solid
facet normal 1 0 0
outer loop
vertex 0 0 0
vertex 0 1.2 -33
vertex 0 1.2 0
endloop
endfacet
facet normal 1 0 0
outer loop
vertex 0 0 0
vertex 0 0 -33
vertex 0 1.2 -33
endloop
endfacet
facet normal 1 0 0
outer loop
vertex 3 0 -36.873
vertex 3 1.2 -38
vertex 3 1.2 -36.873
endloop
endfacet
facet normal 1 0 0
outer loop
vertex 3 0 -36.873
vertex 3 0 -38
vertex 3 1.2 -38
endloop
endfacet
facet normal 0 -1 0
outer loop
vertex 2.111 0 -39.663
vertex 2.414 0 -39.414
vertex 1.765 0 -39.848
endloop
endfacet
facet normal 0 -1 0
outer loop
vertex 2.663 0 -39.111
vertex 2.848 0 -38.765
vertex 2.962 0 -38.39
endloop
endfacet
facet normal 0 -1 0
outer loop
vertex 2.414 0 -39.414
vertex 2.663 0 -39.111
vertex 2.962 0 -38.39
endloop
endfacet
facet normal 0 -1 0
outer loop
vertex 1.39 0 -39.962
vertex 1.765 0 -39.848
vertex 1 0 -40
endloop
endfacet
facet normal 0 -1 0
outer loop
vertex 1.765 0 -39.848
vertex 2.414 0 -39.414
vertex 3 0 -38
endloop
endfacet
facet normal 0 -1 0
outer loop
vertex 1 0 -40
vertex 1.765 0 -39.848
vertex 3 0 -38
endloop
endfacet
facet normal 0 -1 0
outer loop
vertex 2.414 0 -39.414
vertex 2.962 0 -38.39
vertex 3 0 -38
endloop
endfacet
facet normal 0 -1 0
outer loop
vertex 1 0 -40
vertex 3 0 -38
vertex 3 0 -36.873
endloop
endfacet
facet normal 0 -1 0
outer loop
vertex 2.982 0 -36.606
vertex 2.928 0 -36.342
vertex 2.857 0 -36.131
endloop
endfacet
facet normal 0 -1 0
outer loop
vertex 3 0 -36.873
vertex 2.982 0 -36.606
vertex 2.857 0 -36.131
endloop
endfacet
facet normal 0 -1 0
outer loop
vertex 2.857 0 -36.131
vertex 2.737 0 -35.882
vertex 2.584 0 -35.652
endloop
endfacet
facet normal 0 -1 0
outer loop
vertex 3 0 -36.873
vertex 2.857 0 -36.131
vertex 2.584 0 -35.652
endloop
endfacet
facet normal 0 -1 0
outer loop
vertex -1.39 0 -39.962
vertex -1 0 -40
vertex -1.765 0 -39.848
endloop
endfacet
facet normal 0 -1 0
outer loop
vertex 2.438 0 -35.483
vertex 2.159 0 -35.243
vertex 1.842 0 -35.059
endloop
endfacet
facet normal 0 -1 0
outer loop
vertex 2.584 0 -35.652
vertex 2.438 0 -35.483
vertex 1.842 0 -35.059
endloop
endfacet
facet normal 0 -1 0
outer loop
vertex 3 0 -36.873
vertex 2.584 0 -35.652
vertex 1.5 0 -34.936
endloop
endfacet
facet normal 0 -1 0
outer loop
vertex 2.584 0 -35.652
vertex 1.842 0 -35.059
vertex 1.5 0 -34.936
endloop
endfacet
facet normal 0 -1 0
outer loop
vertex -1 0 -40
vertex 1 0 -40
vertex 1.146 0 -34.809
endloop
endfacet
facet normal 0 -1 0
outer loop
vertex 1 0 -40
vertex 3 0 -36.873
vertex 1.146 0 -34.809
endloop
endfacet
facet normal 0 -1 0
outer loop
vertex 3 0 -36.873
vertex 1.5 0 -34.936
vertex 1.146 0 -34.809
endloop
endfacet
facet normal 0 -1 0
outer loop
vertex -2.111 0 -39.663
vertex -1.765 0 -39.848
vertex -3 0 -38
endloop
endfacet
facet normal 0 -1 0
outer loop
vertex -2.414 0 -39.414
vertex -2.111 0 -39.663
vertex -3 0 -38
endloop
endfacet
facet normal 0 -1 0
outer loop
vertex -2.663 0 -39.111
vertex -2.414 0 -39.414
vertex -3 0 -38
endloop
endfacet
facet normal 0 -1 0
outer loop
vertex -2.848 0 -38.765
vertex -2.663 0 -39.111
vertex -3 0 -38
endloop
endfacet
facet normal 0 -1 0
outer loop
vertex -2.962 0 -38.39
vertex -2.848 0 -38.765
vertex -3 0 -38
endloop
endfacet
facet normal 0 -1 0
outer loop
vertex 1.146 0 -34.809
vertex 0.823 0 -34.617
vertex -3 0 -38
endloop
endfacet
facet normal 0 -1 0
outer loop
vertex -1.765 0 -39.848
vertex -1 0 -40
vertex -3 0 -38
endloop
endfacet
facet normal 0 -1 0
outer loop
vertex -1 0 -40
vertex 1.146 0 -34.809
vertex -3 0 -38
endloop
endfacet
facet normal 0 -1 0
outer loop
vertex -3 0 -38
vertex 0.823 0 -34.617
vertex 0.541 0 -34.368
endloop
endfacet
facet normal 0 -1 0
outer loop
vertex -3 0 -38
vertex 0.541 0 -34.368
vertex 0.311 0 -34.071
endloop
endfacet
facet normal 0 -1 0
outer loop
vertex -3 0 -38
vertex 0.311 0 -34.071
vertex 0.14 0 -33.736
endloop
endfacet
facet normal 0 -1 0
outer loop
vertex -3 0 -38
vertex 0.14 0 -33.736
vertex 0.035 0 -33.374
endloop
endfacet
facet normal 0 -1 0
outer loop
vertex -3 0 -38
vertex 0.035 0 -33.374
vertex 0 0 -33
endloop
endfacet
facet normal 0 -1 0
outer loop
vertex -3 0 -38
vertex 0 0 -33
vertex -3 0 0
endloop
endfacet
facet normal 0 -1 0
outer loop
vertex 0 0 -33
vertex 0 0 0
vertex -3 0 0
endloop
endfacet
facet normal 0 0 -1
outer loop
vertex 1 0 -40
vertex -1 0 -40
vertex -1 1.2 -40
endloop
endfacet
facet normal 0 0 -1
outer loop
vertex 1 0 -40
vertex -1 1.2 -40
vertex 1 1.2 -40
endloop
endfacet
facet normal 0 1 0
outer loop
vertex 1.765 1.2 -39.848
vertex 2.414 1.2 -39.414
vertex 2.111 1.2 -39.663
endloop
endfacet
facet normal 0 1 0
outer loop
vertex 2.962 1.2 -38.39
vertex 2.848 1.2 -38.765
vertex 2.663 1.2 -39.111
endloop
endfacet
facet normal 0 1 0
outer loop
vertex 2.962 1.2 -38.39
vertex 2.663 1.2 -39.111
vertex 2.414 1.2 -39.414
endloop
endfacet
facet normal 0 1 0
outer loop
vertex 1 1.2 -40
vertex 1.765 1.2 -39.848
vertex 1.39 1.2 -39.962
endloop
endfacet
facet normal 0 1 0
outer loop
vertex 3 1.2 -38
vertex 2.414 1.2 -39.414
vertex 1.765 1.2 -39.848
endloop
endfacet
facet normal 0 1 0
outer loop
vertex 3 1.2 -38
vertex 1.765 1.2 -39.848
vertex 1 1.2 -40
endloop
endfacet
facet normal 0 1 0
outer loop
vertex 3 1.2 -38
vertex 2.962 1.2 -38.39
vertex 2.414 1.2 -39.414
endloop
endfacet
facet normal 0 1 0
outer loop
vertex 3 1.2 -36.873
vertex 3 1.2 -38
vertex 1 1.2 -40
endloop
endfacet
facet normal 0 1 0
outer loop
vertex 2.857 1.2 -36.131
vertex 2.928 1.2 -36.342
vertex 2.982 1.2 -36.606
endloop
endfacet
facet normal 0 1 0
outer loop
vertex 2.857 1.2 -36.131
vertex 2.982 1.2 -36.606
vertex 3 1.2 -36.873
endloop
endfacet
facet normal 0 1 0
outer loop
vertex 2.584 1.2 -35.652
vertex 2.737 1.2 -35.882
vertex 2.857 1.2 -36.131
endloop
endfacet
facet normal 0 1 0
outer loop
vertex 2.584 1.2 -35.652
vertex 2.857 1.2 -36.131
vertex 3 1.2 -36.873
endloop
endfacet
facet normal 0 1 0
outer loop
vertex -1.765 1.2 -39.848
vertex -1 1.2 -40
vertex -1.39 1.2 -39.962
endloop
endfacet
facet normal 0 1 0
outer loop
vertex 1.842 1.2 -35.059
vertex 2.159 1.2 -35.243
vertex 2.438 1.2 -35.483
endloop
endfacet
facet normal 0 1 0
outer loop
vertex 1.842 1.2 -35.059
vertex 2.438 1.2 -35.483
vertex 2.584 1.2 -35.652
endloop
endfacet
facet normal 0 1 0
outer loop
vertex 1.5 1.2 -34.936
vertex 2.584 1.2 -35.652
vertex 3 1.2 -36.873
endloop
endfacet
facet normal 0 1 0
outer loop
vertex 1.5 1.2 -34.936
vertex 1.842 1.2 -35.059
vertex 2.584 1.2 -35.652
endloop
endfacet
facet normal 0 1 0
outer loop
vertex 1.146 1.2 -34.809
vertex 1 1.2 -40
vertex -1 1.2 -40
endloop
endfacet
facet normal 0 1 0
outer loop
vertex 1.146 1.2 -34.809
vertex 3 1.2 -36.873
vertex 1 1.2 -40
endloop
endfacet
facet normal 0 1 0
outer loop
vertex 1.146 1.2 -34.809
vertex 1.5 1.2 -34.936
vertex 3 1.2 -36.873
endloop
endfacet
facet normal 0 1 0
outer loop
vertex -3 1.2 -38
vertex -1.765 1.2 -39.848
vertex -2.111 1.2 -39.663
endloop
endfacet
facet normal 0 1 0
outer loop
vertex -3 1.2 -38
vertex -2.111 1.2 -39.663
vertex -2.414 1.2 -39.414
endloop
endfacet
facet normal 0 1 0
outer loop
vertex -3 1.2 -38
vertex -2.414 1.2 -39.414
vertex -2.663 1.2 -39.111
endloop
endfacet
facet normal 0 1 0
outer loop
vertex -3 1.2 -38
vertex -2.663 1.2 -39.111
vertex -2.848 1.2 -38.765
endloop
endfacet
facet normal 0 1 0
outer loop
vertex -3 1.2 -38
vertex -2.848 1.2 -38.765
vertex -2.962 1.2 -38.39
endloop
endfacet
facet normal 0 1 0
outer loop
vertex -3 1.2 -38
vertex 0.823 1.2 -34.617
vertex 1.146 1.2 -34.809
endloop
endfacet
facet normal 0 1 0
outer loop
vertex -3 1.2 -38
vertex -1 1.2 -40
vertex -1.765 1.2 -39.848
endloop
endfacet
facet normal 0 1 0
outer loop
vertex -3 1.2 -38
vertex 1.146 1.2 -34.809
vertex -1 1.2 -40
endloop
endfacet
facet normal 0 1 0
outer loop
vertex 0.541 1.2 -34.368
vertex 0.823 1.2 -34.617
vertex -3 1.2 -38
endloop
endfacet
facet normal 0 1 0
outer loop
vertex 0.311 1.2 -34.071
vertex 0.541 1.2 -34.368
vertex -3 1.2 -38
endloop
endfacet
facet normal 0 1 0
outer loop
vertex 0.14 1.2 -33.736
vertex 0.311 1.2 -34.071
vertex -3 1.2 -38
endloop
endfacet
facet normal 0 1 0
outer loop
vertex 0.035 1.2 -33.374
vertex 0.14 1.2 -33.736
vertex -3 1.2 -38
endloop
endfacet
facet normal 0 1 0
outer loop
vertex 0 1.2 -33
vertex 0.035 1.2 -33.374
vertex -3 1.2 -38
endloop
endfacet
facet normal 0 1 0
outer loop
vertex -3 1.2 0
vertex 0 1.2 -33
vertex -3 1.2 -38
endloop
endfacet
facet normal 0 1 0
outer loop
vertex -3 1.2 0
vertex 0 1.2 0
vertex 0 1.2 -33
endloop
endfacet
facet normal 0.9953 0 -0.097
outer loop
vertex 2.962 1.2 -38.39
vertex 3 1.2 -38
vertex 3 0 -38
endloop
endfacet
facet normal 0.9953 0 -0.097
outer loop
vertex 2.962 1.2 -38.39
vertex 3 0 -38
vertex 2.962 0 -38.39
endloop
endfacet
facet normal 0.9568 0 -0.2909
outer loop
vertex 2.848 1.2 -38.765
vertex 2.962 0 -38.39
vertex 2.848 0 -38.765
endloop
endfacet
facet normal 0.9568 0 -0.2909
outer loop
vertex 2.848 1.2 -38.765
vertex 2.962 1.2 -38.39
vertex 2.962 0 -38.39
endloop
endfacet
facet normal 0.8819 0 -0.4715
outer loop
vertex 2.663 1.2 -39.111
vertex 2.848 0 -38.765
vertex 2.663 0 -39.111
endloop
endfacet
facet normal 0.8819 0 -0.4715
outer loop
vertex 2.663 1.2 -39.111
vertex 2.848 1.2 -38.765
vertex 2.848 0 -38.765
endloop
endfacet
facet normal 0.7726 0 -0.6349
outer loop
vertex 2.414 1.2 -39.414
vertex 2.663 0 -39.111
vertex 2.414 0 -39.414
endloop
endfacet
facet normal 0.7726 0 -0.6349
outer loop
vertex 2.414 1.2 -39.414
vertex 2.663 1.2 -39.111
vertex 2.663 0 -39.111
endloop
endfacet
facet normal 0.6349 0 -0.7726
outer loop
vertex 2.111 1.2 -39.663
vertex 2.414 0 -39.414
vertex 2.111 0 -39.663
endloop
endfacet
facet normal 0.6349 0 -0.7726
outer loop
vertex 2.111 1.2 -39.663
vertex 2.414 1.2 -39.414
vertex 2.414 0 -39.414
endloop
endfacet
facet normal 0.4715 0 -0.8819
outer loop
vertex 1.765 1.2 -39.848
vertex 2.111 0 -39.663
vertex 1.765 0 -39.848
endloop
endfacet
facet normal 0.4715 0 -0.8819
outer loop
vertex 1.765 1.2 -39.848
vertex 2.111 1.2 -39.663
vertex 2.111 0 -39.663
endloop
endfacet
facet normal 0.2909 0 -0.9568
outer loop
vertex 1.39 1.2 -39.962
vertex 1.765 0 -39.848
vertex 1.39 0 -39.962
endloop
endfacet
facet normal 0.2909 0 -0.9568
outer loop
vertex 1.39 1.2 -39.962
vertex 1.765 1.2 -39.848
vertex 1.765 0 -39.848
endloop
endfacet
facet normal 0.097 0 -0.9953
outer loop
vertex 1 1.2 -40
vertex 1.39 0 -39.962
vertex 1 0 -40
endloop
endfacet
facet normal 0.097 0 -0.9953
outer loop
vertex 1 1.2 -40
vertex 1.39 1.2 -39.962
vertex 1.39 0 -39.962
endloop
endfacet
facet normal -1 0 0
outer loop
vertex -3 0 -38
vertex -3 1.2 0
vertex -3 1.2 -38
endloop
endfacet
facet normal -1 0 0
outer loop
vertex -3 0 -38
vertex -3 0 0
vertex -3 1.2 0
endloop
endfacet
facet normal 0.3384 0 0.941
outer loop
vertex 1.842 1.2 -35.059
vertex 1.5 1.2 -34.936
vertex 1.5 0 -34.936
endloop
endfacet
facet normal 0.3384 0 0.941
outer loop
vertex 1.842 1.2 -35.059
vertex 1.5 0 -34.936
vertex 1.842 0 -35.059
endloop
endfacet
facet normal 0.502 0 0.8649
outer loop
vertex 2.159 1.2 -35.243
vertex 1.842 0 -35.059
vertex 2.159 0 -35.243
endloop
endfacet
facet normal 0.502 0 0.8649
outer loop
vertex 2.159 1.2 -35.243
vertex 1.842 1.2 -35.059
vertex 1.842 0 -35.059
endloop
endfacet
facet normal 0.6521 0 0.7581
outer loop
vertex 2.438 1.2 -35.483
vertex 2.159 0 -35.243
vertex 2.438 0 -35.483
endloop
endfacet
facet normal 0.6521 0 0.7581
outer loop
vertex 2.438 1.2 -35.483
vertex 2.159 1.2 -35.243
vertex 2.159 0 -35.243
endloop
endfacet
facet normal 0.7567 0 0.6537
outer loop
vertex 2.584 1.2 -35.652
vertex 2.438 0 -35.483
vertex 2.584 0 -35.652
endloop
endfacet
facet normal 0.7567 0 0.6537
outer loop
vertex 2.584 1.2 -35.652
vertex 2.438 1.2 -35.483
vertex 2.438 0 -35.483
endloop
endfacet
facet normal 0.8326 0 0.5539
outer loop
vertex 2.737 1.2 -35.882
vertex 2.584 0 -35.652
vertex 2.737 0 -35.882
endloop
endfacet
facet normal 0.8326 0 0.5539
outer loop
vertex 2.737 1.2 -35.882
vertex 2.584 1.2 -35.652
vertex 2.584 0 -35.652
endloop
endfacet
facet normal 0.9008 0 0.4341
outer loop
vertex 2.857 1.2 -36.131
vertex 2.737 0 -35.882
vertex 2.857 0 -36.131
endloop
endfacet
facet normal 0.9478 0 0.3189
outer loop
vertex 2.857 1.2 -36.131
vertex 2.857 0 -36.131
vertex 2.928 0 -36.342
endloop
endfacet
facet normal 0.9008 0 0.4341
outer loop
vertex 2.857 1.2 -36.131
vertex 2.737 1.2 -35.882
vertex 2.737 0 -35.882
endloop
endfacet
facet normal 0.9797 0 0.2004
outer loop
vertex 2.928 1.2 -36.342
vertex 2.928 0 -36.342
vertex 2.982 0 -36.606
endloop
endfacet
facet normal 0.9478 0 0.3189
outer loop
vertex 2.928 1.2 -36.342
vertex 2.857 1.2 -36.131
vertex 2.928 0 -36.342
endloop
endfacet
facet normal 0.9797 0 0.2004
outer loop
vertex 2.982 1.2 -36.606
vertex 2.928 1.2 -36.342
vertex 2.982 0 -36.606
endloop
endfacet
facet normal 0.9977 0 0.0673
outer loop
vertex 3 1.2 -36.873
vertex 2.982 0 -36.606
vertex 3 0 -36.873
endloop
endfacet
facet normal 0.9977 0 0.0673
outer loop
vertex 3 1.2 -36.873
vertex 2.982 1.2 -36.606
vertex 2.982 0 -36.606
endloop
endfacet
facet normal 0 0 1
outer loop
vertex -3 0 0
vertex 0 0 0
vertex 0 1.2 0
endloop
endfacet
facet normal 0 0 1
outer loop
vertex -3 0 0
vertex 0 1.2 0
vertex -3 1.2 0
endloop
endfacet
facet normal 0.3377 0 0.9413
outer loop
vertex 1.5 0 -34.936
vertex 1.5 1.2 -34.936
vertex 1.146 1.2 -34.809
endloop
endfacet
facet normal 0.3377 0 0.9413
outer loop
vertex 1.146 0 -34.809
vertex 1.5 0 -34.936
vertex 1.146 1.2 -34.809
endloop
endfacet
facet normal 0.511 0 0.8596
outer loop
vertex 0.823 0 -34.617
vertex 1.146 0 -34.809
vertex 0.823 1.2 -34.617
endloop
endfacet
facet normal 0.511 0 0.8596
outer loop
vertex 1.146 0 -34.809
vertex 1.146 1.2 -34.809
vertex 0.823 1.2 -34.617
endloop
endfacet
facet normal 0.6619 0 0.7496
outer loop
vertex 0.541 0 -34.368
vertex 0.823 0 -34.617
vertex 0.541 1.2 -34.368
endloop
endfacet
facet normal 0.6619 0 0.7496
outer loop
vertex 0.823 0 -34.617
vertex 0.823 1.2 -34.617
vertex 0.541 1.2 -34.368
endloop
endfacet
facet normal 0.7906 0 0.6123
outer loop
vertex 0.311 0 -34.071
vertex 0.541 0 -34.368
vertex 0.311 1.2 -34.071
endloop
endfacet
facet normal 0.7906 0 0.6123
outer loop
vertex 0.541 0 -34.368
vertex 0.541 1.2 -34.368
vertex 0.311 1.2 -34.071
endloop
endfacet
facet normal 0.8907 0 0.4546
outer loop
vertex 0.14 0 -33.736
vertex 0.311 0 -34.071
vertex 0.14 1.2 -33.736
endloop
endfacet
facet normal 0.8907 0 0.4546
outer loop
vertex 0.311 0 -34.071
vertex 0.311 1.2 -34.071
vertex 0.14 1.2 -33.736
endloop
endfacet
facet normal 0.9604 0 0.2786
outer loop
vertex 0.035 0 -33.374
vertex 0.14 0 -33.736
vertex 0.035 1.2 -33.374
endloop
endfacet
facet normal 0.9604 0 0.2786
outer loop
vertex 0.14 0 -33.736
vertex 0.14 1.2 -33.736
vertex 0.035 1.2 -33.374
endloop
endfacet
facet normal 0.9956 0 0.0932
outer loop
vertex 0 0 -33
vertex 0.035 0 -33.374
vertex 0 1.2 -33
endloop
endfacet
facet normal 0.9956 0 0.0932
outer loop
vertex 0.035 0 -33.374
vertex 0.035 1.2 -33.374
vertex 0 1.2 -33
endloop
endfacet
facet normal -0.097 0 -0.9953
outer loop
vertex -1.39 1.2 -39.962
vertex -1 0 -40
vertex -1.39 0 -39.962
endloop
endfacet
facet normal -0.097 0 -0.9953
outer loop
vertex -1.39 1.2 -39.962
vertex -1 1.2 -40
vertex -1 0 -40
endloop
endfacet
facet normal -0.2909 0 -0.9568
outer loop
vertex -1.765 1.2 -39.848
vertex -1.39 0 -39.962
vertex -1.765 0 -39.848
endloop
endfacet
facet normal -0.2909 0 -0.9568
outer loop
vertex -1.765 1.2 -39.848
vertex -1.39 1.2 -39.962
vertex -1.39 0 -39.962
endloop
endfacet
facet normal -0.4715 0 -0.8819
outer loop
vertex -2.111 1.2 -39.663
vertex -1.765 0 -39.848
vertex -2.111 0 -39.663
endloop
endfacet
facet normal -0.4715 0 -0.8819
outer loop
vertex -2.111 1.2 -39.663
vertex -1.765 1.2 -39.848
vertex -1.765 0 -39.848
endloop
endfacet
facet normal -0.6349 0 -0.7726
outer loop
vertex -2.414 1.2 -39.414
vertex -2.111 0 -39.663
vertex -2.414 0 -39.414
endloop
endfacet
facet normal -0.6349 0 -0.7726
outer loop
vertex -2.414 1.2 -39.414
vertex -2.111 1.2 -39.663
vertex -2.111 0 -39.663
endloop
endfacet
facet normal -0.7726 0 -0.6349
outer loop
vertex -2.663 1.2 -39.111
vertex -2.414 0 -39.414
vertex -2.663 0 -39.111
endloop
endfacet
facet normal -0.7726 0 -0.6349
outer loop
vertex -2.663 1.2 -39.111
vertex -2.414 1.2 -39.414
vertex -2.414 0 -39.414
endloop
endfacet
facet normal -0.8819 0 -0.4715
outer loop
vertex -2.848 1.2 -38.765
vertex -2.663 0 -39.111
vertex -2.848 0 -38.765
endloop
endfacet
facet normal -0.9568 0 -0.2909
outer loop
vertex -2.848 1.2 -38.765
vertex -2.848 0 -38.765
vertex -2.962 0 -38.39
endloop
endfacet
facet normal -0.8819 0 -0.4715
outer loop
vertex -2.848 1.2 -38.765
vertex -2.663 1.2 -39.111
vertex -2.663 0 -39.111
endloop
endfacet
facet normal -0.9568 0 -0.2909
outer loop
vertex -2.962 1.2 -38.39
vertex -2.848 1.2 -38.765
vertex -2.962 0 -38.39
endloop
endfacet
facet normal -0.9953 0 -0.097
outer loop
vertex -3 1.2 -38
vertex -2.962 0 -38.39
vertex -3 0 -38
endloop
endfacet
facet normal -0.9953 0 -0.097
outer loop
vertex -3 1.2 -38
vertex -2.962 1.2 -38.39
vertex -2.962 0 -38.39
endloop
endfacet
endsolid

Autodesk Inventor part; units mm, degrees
ref_plane "YZ Plane" through (0, 0, 0) normal (1, 0, 0) x (0, 1, 0)
ref_plane "XZ Plane" through (0, 0, 0) normal (0, 1, 0) x (-1, 0, 0)
ref_plane "XY Plane" through (0, 0, 0) normal (0, 0, 1) x (1, 0, 0)
sketch "Sketch1" plane through (0, 0, 0) normal (0, 1, 0) x (-1, 0, 0)
  point P0 (0, 0)
sketch "Sketch2" plane through (0, 0, 0) normal (0, 1, 0) x (-1, 0, 0)
  line L0 (0, 0) -> (3, 0)
  line L1 (3, 0) -> (3, -40)
  line L2 (3, -40) -> (0, -40)
  line L3 (0, -40) -> (0, 0)
  line L4 (0, -40) -> (-3, -40)
  line L5 (-3, -40) -> (-3, -35)
  line L6 (-3, -35) -> (0, -35)
  line L7 (0, -35) -> (0, -40)
  point P0 (0, -35)
  dimension "d0" = 3
  dimension "d1" = 40
  dimension "d4" = 3
  dimension "d5" = 5
extrude "Extrusion1" add sketch "Sketch2" along normal blind 1.2
fillet "Fillet1" radius 2 4 edges at (0, 0.6, -35) (3, 0.6, -35) (3, 0.6, -40) (-3, 0.6, -40)
properties part number "MoveableBarRound"
